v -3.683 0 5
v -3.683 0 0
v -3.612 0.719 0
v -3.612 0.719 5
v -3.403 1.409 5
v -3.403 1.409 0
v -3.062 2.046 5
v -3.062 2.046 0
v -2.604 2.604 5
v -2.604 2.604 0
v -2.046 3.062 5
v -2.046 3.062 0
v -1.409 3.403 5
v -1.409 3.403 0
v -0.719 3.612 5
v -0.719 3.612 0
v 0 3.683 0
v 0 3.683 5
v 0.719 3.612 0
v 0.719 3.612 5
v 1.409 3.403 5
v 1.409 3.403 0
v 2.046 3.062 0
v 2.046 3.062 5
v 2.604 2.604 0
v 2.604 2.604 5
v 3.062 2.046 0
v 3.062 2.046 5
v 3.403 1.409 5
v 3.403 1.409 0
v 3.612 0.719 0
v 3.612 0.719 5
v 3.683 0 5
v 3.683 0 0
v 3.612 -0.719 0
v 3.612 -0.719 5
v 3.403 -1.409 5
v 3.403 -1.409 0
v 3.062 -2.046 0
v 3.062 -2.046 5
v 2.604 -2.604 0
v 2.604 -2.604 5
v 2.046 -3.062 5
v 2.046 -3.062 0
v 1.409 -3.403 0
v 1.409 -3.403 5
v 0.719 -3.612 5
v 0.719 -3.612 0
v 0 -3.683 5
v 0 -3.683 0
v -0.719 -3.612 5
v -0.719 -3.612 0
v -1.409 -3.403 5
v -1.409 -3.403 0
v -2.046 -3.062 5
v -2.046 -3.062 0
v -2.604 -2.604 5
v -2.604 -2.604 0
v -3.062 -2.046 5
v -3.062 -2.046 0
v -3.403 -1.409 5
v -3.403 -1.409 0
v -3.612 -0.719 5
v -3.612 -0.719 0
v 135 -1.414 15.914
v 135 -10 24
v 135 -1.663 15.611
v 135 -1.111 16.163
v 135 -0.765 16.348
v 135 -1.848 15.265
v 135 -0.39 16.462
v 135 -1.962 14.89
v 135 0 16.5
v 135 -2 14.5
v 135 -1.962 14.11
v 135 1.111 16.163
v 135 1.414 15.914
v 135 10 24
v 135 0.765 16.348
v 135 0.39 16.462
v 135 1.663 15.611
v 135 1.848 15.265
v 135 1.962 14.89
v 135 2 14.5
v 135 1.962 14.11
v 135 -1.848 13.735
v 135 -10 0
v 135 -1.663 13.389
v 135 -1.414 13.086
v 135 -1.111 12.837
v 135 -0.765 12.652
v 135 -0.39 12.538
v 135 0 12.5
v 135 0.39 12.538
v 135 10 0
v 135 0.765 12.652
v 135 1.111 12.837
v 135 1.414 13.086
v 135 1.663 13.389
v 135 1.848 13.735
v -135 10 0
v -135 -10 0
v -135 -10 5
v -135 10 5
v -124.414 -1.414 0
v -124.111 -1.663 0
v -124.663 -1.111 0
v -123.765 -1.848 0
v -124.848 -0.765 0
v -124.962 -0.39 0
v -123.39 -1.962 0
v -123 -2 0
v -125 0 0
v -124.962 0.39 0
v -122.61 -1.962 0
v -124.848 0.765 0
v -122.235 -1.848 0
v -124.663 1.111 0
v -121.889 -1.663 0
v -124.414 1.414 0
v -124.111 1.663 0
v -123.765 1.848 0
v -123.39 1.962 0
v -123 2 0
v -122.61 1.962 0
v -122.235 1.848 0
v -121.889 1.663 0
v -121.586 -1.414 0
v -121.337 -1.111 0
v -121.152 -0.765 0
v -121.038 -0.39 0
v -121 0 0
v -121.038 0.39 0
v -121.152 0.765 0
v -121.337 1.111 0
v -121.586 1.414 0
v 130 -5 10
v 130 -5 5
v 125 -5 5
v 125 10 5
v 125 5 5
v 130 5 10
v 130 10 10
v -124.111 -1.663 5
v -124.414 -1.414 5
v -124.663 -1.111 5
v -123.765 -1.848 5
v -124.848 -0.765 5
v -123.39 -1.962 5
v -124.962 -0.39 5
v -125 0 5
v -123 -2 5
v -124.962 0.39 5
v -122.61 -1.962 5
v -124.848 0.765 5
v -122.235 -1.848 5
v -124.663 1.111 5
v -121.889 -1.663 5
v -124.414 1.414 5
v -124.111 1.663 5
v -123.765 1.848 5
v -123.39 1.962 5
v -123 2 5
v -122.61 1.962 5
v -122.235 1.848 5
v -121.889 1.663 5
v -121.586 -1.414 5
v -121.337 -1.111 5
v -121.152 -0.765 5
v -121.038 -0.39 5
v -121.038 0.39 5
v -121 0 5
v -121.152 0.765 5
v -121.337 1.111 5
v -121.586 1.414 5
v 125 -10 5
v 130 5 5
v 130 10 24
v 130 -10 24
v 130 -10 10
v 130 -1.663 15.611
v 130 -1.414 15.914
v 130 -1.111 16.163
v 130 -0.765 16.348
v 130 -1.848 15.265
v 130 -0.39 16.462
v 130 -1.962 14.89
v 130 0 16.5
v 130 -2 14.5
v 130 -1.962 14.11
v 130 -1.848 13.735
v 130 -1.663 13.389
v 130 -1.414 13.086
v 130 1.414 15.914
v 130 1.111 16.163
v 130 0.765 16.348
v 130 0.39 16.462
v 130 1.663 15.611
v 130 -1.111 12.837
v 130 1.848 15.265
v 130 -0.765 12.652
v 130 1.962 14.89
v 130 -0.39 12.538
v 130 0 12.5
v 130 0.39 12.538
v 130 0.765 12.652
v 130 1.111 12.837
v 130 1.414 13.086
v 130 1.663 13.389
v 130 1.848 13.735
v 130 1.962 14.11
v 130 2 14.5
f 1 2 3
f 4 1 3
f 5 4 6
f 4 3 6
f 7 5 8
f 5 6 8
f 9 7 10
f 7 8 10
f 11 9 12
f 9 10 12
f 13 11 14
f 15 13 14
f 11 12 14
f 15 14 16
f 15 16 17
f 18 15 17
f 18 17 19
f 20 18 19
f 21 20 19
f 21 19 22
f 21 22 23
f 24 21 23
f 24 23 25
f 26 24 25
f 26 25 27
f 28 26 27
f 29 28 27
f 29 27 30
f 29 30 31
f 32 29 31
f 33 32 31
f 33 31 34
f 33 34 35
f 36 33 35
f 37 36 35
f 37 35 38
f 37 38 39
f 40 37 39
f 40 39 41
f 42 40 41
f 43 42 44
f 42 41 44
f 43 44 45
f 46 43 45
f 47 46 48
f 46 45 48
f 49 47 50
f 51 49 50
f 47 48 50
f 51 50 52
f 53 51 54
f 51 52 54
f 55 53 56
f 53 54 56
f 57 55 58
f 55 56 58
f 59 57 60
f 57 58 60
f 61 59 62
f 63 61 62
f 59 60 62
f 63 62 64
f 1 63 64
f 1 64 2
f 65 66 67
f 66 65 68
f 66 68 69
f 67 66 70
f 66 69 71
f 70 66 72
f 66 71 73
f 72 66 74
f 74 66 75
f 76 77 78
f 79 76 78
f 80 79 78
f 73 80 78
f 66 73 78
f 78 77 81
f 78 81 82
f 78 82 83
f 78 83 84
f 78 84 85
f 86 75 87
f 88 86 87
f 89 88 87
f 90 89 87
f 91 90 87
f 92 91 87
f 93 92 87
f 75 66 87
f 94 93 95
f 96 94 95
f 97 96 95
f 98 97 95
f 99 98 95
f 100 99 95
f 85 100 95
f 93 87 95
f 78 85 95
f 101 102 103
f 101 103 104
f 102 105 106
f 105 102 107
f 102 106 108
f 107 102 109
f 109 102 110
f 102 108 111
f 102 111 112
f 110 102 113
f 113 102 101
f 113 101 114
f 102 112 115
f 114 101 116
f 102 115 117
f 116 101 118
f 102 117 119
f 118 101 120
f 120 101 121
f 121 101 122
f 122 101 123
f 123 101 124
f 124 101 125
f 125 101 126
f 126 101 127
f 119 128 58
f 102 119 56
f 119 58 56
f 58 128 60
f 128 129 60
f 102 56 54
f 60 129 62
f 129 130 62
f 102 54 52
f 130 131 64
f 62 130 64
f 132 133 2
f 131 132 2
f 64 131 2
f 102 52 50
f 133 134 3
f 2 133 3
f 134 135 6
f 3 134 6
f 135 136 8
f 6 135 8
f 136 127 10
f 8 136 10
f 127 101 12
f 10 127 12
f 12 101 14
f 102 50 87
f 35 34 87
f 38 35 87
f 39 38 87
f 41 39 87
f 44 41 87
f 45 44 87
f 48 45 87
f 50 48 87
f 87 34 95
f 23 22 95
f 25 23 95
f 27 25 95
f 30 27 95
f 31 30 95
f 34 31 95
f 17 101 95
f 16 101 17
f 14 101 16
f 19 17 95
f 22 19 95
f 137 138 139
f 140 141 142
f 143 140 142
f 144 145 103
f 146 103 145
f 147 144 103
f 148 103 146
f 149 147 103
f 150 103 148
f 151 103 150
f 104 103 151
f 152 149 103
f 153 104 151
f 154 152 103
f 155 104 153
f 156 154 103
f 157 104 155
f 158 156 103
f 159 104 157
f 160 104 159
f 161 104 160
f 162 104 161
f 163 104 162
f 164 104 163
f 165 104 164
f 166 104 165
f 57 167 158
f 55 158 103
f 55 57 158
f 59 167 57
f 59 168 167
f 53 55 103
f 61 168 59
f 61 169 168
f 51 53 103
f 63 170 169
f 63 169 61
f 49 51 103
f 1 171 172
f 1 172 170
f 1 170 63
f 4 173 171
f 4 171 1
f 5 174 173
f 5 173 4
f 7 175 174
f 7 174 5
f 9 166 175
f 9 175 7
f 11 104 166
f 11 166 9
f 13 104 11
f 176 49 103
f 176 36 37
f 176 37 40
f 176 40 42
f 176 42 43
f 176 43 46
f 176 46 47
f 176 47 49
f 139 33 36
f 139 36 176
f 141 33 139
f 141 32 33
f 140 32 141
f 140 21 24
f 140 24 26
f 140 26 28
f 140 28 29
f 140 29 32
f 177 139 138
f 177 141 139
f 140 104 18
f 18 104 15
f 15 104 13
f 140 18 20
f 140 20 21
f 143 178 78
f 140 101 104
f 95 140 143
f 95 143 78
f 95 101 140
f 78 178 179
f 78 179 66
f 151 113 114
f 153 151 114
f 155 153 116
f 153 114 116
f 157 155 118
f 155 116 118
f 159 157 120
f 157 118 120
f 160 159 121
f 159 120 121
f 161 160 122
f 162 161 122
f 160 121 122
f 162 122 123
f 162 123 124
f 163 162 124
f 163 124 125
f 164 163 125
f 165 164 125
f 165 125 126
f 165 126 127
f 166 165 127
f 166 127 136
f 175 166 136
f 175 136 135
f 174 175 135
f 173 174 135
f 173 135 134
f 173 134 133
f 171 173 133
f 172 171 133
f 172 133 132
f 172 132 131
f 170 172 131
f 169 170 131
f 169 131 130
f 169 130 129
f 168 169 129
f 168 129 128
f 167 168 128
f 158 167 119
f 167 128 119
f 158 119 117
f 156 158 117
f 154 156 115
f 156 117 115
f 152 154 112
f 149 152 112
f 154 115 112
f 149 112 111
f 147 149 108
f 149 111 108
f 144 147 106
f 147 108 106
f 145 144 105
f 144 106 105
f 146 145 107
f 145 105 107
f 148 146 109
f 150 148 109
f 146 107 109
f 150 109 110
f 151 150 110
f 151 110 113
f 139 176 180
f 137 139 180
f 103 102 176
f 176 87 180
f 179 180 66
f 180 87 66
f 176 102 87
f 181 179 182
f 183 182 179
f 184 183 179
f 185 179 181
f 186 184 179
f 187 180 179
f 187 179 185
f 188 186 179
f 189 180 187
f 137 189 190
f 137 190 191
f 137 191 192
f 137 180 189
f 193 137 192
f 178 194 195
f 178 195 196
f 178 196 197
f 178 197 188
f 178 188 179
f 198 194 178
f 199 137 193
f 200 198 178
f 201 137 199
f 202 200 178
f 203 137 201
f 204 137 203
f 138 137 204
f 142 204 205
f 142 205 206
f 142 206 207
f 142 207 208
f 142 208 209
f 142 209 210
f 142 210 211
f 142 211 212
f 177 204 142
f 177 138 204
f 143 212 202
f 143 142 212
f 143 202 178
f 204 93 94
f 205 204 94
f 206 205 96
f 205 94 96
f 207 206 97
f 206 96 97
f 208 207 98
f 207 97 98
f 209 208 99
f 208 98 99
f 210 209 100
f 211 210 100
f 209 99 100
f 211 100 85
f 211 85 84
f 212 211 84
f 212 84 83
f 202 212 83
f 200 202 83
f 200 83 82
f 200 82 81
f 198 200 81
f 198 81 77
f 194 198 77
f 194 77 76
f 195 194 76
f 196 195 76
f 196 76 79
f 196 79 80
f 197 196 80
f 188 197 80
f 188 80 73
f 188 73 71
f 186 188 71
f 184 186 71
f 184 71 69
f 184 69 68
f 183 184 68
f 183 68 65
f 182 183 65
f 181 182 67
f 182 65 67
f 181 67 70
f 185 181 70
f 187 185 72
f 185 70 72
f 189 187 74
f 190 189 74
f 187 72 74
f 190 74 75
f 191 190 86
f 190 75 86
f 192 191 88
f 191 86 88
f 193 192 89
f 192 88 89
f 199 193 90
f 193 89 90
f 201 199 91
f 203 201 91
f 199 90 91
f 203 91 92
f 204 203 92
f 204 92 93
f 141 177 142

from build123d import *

# Parameters (mm, degrees)
SKETCH1_W           = 270
SKETCH1_H           = 20
BOSS_EXTRUDE1_DEPTH = 5
SKETCH2_W           = 5
SKETCH2_H           = 20
BOSS_EXTRUDE2_DEPTH = 19
SKETCH3_R           = 2
CUT_EXTRUDE1_DEPTH  = 272.248963132
SKETCH4_W           = 5
SKETCH4_H           = 5
BOSS_EXTRUDE3_DEPTH = 5
CUT_EXTRUDE2_DEPTH  = 139.567672998
SKETCH6_R           = 2
CUT_EXTRUDE3_DEPTH  = 138.480907765
SKETCH7_R           = 3.68294157
CUT_EXTRUDE4_DEPTH  = 10


with BuildPart() as part:
    # Sketch1 → Boss-Extrude1 (new body)
    with BuildSketch(Plane.XY):
        Rectangle(SKETCH1_W, SKETCH1_H)
    extrude(amount=BOSS_EXTRUDE1_DEPTH)

    # Sketch2 → Boss-Extrude2 (add)
    with BuildSketch(Plane.XY.offset(5)):
        with Locations((132.5, 0)):
            Rectangle(SKETCH2_W, SKETCH2_H)
    extrude(amount=BOSS_EXTRUDE2_DEPTH)

    # Sketch3 → Cut-Extrude1 (cut, through all)
    with BuildSketch(Plane(origin=(135, 0, 0), x_dir=(0, 0, -1), z_dir=(1, 0, 0))):
        with Locations((-14.5, 0)):
            Circle(SKETCH3_R)
    extrude(amount=-CUT_EXTRUDE1_DEPTH, mode=Mode.SUBTRACT)

    # Sketch4 → Boss-Extrude3 (add)
    with BuildSketch(Plane.ZY.offset(-130)):
        with Locations((7.5, -7.5)):
            Rectangle(SKETCH4_W, SKETCH4_H)
        with Locations((7.5, 7.5)):
            Rectangle(SKETCH4_W, SKETCH4_H)
    extrude(amount=BOSS_EXTRUDE3_DEPTH)

    # Sketch5 → Cut-Extrude2 (cut, through all)
    with BuildSketch(Plane.XZ.offset(10)):
        Polygon((125, 5), (130, 10), (125, 10), align=None)
    extrude(amount=-CUT_EXTRUDE2_DEPTH, mode=Mode.SUBTRACT)

    # Sketch6 → Cut-Extrude3 (cut, through all)
    with BuildSketch(Plane(origin=(0, 0, 0), x_dir=(-1, 0, 0), z_dir=(0, 0, -1))):
        with Locations((123, 0)):
            Circle(SKETCH6_R)
    extrude(amount=-CUT_EXTRUDE3_DEPTH, mode=Mode.SUBTRACT)

    # Sketch7 → Cut-Extrude4 (cut)
    with BuildSketch(Plane(origin=(0, 0, 0), x_dir=(-1, 0, 0), z_dir=(0, 0, -1))):
        Circle(SKETCH7_R)
    extrude(amount=-CUT_EXTRUDE4_DEPTH, mode=Mode.SUBTRACT)


solid = part.part
